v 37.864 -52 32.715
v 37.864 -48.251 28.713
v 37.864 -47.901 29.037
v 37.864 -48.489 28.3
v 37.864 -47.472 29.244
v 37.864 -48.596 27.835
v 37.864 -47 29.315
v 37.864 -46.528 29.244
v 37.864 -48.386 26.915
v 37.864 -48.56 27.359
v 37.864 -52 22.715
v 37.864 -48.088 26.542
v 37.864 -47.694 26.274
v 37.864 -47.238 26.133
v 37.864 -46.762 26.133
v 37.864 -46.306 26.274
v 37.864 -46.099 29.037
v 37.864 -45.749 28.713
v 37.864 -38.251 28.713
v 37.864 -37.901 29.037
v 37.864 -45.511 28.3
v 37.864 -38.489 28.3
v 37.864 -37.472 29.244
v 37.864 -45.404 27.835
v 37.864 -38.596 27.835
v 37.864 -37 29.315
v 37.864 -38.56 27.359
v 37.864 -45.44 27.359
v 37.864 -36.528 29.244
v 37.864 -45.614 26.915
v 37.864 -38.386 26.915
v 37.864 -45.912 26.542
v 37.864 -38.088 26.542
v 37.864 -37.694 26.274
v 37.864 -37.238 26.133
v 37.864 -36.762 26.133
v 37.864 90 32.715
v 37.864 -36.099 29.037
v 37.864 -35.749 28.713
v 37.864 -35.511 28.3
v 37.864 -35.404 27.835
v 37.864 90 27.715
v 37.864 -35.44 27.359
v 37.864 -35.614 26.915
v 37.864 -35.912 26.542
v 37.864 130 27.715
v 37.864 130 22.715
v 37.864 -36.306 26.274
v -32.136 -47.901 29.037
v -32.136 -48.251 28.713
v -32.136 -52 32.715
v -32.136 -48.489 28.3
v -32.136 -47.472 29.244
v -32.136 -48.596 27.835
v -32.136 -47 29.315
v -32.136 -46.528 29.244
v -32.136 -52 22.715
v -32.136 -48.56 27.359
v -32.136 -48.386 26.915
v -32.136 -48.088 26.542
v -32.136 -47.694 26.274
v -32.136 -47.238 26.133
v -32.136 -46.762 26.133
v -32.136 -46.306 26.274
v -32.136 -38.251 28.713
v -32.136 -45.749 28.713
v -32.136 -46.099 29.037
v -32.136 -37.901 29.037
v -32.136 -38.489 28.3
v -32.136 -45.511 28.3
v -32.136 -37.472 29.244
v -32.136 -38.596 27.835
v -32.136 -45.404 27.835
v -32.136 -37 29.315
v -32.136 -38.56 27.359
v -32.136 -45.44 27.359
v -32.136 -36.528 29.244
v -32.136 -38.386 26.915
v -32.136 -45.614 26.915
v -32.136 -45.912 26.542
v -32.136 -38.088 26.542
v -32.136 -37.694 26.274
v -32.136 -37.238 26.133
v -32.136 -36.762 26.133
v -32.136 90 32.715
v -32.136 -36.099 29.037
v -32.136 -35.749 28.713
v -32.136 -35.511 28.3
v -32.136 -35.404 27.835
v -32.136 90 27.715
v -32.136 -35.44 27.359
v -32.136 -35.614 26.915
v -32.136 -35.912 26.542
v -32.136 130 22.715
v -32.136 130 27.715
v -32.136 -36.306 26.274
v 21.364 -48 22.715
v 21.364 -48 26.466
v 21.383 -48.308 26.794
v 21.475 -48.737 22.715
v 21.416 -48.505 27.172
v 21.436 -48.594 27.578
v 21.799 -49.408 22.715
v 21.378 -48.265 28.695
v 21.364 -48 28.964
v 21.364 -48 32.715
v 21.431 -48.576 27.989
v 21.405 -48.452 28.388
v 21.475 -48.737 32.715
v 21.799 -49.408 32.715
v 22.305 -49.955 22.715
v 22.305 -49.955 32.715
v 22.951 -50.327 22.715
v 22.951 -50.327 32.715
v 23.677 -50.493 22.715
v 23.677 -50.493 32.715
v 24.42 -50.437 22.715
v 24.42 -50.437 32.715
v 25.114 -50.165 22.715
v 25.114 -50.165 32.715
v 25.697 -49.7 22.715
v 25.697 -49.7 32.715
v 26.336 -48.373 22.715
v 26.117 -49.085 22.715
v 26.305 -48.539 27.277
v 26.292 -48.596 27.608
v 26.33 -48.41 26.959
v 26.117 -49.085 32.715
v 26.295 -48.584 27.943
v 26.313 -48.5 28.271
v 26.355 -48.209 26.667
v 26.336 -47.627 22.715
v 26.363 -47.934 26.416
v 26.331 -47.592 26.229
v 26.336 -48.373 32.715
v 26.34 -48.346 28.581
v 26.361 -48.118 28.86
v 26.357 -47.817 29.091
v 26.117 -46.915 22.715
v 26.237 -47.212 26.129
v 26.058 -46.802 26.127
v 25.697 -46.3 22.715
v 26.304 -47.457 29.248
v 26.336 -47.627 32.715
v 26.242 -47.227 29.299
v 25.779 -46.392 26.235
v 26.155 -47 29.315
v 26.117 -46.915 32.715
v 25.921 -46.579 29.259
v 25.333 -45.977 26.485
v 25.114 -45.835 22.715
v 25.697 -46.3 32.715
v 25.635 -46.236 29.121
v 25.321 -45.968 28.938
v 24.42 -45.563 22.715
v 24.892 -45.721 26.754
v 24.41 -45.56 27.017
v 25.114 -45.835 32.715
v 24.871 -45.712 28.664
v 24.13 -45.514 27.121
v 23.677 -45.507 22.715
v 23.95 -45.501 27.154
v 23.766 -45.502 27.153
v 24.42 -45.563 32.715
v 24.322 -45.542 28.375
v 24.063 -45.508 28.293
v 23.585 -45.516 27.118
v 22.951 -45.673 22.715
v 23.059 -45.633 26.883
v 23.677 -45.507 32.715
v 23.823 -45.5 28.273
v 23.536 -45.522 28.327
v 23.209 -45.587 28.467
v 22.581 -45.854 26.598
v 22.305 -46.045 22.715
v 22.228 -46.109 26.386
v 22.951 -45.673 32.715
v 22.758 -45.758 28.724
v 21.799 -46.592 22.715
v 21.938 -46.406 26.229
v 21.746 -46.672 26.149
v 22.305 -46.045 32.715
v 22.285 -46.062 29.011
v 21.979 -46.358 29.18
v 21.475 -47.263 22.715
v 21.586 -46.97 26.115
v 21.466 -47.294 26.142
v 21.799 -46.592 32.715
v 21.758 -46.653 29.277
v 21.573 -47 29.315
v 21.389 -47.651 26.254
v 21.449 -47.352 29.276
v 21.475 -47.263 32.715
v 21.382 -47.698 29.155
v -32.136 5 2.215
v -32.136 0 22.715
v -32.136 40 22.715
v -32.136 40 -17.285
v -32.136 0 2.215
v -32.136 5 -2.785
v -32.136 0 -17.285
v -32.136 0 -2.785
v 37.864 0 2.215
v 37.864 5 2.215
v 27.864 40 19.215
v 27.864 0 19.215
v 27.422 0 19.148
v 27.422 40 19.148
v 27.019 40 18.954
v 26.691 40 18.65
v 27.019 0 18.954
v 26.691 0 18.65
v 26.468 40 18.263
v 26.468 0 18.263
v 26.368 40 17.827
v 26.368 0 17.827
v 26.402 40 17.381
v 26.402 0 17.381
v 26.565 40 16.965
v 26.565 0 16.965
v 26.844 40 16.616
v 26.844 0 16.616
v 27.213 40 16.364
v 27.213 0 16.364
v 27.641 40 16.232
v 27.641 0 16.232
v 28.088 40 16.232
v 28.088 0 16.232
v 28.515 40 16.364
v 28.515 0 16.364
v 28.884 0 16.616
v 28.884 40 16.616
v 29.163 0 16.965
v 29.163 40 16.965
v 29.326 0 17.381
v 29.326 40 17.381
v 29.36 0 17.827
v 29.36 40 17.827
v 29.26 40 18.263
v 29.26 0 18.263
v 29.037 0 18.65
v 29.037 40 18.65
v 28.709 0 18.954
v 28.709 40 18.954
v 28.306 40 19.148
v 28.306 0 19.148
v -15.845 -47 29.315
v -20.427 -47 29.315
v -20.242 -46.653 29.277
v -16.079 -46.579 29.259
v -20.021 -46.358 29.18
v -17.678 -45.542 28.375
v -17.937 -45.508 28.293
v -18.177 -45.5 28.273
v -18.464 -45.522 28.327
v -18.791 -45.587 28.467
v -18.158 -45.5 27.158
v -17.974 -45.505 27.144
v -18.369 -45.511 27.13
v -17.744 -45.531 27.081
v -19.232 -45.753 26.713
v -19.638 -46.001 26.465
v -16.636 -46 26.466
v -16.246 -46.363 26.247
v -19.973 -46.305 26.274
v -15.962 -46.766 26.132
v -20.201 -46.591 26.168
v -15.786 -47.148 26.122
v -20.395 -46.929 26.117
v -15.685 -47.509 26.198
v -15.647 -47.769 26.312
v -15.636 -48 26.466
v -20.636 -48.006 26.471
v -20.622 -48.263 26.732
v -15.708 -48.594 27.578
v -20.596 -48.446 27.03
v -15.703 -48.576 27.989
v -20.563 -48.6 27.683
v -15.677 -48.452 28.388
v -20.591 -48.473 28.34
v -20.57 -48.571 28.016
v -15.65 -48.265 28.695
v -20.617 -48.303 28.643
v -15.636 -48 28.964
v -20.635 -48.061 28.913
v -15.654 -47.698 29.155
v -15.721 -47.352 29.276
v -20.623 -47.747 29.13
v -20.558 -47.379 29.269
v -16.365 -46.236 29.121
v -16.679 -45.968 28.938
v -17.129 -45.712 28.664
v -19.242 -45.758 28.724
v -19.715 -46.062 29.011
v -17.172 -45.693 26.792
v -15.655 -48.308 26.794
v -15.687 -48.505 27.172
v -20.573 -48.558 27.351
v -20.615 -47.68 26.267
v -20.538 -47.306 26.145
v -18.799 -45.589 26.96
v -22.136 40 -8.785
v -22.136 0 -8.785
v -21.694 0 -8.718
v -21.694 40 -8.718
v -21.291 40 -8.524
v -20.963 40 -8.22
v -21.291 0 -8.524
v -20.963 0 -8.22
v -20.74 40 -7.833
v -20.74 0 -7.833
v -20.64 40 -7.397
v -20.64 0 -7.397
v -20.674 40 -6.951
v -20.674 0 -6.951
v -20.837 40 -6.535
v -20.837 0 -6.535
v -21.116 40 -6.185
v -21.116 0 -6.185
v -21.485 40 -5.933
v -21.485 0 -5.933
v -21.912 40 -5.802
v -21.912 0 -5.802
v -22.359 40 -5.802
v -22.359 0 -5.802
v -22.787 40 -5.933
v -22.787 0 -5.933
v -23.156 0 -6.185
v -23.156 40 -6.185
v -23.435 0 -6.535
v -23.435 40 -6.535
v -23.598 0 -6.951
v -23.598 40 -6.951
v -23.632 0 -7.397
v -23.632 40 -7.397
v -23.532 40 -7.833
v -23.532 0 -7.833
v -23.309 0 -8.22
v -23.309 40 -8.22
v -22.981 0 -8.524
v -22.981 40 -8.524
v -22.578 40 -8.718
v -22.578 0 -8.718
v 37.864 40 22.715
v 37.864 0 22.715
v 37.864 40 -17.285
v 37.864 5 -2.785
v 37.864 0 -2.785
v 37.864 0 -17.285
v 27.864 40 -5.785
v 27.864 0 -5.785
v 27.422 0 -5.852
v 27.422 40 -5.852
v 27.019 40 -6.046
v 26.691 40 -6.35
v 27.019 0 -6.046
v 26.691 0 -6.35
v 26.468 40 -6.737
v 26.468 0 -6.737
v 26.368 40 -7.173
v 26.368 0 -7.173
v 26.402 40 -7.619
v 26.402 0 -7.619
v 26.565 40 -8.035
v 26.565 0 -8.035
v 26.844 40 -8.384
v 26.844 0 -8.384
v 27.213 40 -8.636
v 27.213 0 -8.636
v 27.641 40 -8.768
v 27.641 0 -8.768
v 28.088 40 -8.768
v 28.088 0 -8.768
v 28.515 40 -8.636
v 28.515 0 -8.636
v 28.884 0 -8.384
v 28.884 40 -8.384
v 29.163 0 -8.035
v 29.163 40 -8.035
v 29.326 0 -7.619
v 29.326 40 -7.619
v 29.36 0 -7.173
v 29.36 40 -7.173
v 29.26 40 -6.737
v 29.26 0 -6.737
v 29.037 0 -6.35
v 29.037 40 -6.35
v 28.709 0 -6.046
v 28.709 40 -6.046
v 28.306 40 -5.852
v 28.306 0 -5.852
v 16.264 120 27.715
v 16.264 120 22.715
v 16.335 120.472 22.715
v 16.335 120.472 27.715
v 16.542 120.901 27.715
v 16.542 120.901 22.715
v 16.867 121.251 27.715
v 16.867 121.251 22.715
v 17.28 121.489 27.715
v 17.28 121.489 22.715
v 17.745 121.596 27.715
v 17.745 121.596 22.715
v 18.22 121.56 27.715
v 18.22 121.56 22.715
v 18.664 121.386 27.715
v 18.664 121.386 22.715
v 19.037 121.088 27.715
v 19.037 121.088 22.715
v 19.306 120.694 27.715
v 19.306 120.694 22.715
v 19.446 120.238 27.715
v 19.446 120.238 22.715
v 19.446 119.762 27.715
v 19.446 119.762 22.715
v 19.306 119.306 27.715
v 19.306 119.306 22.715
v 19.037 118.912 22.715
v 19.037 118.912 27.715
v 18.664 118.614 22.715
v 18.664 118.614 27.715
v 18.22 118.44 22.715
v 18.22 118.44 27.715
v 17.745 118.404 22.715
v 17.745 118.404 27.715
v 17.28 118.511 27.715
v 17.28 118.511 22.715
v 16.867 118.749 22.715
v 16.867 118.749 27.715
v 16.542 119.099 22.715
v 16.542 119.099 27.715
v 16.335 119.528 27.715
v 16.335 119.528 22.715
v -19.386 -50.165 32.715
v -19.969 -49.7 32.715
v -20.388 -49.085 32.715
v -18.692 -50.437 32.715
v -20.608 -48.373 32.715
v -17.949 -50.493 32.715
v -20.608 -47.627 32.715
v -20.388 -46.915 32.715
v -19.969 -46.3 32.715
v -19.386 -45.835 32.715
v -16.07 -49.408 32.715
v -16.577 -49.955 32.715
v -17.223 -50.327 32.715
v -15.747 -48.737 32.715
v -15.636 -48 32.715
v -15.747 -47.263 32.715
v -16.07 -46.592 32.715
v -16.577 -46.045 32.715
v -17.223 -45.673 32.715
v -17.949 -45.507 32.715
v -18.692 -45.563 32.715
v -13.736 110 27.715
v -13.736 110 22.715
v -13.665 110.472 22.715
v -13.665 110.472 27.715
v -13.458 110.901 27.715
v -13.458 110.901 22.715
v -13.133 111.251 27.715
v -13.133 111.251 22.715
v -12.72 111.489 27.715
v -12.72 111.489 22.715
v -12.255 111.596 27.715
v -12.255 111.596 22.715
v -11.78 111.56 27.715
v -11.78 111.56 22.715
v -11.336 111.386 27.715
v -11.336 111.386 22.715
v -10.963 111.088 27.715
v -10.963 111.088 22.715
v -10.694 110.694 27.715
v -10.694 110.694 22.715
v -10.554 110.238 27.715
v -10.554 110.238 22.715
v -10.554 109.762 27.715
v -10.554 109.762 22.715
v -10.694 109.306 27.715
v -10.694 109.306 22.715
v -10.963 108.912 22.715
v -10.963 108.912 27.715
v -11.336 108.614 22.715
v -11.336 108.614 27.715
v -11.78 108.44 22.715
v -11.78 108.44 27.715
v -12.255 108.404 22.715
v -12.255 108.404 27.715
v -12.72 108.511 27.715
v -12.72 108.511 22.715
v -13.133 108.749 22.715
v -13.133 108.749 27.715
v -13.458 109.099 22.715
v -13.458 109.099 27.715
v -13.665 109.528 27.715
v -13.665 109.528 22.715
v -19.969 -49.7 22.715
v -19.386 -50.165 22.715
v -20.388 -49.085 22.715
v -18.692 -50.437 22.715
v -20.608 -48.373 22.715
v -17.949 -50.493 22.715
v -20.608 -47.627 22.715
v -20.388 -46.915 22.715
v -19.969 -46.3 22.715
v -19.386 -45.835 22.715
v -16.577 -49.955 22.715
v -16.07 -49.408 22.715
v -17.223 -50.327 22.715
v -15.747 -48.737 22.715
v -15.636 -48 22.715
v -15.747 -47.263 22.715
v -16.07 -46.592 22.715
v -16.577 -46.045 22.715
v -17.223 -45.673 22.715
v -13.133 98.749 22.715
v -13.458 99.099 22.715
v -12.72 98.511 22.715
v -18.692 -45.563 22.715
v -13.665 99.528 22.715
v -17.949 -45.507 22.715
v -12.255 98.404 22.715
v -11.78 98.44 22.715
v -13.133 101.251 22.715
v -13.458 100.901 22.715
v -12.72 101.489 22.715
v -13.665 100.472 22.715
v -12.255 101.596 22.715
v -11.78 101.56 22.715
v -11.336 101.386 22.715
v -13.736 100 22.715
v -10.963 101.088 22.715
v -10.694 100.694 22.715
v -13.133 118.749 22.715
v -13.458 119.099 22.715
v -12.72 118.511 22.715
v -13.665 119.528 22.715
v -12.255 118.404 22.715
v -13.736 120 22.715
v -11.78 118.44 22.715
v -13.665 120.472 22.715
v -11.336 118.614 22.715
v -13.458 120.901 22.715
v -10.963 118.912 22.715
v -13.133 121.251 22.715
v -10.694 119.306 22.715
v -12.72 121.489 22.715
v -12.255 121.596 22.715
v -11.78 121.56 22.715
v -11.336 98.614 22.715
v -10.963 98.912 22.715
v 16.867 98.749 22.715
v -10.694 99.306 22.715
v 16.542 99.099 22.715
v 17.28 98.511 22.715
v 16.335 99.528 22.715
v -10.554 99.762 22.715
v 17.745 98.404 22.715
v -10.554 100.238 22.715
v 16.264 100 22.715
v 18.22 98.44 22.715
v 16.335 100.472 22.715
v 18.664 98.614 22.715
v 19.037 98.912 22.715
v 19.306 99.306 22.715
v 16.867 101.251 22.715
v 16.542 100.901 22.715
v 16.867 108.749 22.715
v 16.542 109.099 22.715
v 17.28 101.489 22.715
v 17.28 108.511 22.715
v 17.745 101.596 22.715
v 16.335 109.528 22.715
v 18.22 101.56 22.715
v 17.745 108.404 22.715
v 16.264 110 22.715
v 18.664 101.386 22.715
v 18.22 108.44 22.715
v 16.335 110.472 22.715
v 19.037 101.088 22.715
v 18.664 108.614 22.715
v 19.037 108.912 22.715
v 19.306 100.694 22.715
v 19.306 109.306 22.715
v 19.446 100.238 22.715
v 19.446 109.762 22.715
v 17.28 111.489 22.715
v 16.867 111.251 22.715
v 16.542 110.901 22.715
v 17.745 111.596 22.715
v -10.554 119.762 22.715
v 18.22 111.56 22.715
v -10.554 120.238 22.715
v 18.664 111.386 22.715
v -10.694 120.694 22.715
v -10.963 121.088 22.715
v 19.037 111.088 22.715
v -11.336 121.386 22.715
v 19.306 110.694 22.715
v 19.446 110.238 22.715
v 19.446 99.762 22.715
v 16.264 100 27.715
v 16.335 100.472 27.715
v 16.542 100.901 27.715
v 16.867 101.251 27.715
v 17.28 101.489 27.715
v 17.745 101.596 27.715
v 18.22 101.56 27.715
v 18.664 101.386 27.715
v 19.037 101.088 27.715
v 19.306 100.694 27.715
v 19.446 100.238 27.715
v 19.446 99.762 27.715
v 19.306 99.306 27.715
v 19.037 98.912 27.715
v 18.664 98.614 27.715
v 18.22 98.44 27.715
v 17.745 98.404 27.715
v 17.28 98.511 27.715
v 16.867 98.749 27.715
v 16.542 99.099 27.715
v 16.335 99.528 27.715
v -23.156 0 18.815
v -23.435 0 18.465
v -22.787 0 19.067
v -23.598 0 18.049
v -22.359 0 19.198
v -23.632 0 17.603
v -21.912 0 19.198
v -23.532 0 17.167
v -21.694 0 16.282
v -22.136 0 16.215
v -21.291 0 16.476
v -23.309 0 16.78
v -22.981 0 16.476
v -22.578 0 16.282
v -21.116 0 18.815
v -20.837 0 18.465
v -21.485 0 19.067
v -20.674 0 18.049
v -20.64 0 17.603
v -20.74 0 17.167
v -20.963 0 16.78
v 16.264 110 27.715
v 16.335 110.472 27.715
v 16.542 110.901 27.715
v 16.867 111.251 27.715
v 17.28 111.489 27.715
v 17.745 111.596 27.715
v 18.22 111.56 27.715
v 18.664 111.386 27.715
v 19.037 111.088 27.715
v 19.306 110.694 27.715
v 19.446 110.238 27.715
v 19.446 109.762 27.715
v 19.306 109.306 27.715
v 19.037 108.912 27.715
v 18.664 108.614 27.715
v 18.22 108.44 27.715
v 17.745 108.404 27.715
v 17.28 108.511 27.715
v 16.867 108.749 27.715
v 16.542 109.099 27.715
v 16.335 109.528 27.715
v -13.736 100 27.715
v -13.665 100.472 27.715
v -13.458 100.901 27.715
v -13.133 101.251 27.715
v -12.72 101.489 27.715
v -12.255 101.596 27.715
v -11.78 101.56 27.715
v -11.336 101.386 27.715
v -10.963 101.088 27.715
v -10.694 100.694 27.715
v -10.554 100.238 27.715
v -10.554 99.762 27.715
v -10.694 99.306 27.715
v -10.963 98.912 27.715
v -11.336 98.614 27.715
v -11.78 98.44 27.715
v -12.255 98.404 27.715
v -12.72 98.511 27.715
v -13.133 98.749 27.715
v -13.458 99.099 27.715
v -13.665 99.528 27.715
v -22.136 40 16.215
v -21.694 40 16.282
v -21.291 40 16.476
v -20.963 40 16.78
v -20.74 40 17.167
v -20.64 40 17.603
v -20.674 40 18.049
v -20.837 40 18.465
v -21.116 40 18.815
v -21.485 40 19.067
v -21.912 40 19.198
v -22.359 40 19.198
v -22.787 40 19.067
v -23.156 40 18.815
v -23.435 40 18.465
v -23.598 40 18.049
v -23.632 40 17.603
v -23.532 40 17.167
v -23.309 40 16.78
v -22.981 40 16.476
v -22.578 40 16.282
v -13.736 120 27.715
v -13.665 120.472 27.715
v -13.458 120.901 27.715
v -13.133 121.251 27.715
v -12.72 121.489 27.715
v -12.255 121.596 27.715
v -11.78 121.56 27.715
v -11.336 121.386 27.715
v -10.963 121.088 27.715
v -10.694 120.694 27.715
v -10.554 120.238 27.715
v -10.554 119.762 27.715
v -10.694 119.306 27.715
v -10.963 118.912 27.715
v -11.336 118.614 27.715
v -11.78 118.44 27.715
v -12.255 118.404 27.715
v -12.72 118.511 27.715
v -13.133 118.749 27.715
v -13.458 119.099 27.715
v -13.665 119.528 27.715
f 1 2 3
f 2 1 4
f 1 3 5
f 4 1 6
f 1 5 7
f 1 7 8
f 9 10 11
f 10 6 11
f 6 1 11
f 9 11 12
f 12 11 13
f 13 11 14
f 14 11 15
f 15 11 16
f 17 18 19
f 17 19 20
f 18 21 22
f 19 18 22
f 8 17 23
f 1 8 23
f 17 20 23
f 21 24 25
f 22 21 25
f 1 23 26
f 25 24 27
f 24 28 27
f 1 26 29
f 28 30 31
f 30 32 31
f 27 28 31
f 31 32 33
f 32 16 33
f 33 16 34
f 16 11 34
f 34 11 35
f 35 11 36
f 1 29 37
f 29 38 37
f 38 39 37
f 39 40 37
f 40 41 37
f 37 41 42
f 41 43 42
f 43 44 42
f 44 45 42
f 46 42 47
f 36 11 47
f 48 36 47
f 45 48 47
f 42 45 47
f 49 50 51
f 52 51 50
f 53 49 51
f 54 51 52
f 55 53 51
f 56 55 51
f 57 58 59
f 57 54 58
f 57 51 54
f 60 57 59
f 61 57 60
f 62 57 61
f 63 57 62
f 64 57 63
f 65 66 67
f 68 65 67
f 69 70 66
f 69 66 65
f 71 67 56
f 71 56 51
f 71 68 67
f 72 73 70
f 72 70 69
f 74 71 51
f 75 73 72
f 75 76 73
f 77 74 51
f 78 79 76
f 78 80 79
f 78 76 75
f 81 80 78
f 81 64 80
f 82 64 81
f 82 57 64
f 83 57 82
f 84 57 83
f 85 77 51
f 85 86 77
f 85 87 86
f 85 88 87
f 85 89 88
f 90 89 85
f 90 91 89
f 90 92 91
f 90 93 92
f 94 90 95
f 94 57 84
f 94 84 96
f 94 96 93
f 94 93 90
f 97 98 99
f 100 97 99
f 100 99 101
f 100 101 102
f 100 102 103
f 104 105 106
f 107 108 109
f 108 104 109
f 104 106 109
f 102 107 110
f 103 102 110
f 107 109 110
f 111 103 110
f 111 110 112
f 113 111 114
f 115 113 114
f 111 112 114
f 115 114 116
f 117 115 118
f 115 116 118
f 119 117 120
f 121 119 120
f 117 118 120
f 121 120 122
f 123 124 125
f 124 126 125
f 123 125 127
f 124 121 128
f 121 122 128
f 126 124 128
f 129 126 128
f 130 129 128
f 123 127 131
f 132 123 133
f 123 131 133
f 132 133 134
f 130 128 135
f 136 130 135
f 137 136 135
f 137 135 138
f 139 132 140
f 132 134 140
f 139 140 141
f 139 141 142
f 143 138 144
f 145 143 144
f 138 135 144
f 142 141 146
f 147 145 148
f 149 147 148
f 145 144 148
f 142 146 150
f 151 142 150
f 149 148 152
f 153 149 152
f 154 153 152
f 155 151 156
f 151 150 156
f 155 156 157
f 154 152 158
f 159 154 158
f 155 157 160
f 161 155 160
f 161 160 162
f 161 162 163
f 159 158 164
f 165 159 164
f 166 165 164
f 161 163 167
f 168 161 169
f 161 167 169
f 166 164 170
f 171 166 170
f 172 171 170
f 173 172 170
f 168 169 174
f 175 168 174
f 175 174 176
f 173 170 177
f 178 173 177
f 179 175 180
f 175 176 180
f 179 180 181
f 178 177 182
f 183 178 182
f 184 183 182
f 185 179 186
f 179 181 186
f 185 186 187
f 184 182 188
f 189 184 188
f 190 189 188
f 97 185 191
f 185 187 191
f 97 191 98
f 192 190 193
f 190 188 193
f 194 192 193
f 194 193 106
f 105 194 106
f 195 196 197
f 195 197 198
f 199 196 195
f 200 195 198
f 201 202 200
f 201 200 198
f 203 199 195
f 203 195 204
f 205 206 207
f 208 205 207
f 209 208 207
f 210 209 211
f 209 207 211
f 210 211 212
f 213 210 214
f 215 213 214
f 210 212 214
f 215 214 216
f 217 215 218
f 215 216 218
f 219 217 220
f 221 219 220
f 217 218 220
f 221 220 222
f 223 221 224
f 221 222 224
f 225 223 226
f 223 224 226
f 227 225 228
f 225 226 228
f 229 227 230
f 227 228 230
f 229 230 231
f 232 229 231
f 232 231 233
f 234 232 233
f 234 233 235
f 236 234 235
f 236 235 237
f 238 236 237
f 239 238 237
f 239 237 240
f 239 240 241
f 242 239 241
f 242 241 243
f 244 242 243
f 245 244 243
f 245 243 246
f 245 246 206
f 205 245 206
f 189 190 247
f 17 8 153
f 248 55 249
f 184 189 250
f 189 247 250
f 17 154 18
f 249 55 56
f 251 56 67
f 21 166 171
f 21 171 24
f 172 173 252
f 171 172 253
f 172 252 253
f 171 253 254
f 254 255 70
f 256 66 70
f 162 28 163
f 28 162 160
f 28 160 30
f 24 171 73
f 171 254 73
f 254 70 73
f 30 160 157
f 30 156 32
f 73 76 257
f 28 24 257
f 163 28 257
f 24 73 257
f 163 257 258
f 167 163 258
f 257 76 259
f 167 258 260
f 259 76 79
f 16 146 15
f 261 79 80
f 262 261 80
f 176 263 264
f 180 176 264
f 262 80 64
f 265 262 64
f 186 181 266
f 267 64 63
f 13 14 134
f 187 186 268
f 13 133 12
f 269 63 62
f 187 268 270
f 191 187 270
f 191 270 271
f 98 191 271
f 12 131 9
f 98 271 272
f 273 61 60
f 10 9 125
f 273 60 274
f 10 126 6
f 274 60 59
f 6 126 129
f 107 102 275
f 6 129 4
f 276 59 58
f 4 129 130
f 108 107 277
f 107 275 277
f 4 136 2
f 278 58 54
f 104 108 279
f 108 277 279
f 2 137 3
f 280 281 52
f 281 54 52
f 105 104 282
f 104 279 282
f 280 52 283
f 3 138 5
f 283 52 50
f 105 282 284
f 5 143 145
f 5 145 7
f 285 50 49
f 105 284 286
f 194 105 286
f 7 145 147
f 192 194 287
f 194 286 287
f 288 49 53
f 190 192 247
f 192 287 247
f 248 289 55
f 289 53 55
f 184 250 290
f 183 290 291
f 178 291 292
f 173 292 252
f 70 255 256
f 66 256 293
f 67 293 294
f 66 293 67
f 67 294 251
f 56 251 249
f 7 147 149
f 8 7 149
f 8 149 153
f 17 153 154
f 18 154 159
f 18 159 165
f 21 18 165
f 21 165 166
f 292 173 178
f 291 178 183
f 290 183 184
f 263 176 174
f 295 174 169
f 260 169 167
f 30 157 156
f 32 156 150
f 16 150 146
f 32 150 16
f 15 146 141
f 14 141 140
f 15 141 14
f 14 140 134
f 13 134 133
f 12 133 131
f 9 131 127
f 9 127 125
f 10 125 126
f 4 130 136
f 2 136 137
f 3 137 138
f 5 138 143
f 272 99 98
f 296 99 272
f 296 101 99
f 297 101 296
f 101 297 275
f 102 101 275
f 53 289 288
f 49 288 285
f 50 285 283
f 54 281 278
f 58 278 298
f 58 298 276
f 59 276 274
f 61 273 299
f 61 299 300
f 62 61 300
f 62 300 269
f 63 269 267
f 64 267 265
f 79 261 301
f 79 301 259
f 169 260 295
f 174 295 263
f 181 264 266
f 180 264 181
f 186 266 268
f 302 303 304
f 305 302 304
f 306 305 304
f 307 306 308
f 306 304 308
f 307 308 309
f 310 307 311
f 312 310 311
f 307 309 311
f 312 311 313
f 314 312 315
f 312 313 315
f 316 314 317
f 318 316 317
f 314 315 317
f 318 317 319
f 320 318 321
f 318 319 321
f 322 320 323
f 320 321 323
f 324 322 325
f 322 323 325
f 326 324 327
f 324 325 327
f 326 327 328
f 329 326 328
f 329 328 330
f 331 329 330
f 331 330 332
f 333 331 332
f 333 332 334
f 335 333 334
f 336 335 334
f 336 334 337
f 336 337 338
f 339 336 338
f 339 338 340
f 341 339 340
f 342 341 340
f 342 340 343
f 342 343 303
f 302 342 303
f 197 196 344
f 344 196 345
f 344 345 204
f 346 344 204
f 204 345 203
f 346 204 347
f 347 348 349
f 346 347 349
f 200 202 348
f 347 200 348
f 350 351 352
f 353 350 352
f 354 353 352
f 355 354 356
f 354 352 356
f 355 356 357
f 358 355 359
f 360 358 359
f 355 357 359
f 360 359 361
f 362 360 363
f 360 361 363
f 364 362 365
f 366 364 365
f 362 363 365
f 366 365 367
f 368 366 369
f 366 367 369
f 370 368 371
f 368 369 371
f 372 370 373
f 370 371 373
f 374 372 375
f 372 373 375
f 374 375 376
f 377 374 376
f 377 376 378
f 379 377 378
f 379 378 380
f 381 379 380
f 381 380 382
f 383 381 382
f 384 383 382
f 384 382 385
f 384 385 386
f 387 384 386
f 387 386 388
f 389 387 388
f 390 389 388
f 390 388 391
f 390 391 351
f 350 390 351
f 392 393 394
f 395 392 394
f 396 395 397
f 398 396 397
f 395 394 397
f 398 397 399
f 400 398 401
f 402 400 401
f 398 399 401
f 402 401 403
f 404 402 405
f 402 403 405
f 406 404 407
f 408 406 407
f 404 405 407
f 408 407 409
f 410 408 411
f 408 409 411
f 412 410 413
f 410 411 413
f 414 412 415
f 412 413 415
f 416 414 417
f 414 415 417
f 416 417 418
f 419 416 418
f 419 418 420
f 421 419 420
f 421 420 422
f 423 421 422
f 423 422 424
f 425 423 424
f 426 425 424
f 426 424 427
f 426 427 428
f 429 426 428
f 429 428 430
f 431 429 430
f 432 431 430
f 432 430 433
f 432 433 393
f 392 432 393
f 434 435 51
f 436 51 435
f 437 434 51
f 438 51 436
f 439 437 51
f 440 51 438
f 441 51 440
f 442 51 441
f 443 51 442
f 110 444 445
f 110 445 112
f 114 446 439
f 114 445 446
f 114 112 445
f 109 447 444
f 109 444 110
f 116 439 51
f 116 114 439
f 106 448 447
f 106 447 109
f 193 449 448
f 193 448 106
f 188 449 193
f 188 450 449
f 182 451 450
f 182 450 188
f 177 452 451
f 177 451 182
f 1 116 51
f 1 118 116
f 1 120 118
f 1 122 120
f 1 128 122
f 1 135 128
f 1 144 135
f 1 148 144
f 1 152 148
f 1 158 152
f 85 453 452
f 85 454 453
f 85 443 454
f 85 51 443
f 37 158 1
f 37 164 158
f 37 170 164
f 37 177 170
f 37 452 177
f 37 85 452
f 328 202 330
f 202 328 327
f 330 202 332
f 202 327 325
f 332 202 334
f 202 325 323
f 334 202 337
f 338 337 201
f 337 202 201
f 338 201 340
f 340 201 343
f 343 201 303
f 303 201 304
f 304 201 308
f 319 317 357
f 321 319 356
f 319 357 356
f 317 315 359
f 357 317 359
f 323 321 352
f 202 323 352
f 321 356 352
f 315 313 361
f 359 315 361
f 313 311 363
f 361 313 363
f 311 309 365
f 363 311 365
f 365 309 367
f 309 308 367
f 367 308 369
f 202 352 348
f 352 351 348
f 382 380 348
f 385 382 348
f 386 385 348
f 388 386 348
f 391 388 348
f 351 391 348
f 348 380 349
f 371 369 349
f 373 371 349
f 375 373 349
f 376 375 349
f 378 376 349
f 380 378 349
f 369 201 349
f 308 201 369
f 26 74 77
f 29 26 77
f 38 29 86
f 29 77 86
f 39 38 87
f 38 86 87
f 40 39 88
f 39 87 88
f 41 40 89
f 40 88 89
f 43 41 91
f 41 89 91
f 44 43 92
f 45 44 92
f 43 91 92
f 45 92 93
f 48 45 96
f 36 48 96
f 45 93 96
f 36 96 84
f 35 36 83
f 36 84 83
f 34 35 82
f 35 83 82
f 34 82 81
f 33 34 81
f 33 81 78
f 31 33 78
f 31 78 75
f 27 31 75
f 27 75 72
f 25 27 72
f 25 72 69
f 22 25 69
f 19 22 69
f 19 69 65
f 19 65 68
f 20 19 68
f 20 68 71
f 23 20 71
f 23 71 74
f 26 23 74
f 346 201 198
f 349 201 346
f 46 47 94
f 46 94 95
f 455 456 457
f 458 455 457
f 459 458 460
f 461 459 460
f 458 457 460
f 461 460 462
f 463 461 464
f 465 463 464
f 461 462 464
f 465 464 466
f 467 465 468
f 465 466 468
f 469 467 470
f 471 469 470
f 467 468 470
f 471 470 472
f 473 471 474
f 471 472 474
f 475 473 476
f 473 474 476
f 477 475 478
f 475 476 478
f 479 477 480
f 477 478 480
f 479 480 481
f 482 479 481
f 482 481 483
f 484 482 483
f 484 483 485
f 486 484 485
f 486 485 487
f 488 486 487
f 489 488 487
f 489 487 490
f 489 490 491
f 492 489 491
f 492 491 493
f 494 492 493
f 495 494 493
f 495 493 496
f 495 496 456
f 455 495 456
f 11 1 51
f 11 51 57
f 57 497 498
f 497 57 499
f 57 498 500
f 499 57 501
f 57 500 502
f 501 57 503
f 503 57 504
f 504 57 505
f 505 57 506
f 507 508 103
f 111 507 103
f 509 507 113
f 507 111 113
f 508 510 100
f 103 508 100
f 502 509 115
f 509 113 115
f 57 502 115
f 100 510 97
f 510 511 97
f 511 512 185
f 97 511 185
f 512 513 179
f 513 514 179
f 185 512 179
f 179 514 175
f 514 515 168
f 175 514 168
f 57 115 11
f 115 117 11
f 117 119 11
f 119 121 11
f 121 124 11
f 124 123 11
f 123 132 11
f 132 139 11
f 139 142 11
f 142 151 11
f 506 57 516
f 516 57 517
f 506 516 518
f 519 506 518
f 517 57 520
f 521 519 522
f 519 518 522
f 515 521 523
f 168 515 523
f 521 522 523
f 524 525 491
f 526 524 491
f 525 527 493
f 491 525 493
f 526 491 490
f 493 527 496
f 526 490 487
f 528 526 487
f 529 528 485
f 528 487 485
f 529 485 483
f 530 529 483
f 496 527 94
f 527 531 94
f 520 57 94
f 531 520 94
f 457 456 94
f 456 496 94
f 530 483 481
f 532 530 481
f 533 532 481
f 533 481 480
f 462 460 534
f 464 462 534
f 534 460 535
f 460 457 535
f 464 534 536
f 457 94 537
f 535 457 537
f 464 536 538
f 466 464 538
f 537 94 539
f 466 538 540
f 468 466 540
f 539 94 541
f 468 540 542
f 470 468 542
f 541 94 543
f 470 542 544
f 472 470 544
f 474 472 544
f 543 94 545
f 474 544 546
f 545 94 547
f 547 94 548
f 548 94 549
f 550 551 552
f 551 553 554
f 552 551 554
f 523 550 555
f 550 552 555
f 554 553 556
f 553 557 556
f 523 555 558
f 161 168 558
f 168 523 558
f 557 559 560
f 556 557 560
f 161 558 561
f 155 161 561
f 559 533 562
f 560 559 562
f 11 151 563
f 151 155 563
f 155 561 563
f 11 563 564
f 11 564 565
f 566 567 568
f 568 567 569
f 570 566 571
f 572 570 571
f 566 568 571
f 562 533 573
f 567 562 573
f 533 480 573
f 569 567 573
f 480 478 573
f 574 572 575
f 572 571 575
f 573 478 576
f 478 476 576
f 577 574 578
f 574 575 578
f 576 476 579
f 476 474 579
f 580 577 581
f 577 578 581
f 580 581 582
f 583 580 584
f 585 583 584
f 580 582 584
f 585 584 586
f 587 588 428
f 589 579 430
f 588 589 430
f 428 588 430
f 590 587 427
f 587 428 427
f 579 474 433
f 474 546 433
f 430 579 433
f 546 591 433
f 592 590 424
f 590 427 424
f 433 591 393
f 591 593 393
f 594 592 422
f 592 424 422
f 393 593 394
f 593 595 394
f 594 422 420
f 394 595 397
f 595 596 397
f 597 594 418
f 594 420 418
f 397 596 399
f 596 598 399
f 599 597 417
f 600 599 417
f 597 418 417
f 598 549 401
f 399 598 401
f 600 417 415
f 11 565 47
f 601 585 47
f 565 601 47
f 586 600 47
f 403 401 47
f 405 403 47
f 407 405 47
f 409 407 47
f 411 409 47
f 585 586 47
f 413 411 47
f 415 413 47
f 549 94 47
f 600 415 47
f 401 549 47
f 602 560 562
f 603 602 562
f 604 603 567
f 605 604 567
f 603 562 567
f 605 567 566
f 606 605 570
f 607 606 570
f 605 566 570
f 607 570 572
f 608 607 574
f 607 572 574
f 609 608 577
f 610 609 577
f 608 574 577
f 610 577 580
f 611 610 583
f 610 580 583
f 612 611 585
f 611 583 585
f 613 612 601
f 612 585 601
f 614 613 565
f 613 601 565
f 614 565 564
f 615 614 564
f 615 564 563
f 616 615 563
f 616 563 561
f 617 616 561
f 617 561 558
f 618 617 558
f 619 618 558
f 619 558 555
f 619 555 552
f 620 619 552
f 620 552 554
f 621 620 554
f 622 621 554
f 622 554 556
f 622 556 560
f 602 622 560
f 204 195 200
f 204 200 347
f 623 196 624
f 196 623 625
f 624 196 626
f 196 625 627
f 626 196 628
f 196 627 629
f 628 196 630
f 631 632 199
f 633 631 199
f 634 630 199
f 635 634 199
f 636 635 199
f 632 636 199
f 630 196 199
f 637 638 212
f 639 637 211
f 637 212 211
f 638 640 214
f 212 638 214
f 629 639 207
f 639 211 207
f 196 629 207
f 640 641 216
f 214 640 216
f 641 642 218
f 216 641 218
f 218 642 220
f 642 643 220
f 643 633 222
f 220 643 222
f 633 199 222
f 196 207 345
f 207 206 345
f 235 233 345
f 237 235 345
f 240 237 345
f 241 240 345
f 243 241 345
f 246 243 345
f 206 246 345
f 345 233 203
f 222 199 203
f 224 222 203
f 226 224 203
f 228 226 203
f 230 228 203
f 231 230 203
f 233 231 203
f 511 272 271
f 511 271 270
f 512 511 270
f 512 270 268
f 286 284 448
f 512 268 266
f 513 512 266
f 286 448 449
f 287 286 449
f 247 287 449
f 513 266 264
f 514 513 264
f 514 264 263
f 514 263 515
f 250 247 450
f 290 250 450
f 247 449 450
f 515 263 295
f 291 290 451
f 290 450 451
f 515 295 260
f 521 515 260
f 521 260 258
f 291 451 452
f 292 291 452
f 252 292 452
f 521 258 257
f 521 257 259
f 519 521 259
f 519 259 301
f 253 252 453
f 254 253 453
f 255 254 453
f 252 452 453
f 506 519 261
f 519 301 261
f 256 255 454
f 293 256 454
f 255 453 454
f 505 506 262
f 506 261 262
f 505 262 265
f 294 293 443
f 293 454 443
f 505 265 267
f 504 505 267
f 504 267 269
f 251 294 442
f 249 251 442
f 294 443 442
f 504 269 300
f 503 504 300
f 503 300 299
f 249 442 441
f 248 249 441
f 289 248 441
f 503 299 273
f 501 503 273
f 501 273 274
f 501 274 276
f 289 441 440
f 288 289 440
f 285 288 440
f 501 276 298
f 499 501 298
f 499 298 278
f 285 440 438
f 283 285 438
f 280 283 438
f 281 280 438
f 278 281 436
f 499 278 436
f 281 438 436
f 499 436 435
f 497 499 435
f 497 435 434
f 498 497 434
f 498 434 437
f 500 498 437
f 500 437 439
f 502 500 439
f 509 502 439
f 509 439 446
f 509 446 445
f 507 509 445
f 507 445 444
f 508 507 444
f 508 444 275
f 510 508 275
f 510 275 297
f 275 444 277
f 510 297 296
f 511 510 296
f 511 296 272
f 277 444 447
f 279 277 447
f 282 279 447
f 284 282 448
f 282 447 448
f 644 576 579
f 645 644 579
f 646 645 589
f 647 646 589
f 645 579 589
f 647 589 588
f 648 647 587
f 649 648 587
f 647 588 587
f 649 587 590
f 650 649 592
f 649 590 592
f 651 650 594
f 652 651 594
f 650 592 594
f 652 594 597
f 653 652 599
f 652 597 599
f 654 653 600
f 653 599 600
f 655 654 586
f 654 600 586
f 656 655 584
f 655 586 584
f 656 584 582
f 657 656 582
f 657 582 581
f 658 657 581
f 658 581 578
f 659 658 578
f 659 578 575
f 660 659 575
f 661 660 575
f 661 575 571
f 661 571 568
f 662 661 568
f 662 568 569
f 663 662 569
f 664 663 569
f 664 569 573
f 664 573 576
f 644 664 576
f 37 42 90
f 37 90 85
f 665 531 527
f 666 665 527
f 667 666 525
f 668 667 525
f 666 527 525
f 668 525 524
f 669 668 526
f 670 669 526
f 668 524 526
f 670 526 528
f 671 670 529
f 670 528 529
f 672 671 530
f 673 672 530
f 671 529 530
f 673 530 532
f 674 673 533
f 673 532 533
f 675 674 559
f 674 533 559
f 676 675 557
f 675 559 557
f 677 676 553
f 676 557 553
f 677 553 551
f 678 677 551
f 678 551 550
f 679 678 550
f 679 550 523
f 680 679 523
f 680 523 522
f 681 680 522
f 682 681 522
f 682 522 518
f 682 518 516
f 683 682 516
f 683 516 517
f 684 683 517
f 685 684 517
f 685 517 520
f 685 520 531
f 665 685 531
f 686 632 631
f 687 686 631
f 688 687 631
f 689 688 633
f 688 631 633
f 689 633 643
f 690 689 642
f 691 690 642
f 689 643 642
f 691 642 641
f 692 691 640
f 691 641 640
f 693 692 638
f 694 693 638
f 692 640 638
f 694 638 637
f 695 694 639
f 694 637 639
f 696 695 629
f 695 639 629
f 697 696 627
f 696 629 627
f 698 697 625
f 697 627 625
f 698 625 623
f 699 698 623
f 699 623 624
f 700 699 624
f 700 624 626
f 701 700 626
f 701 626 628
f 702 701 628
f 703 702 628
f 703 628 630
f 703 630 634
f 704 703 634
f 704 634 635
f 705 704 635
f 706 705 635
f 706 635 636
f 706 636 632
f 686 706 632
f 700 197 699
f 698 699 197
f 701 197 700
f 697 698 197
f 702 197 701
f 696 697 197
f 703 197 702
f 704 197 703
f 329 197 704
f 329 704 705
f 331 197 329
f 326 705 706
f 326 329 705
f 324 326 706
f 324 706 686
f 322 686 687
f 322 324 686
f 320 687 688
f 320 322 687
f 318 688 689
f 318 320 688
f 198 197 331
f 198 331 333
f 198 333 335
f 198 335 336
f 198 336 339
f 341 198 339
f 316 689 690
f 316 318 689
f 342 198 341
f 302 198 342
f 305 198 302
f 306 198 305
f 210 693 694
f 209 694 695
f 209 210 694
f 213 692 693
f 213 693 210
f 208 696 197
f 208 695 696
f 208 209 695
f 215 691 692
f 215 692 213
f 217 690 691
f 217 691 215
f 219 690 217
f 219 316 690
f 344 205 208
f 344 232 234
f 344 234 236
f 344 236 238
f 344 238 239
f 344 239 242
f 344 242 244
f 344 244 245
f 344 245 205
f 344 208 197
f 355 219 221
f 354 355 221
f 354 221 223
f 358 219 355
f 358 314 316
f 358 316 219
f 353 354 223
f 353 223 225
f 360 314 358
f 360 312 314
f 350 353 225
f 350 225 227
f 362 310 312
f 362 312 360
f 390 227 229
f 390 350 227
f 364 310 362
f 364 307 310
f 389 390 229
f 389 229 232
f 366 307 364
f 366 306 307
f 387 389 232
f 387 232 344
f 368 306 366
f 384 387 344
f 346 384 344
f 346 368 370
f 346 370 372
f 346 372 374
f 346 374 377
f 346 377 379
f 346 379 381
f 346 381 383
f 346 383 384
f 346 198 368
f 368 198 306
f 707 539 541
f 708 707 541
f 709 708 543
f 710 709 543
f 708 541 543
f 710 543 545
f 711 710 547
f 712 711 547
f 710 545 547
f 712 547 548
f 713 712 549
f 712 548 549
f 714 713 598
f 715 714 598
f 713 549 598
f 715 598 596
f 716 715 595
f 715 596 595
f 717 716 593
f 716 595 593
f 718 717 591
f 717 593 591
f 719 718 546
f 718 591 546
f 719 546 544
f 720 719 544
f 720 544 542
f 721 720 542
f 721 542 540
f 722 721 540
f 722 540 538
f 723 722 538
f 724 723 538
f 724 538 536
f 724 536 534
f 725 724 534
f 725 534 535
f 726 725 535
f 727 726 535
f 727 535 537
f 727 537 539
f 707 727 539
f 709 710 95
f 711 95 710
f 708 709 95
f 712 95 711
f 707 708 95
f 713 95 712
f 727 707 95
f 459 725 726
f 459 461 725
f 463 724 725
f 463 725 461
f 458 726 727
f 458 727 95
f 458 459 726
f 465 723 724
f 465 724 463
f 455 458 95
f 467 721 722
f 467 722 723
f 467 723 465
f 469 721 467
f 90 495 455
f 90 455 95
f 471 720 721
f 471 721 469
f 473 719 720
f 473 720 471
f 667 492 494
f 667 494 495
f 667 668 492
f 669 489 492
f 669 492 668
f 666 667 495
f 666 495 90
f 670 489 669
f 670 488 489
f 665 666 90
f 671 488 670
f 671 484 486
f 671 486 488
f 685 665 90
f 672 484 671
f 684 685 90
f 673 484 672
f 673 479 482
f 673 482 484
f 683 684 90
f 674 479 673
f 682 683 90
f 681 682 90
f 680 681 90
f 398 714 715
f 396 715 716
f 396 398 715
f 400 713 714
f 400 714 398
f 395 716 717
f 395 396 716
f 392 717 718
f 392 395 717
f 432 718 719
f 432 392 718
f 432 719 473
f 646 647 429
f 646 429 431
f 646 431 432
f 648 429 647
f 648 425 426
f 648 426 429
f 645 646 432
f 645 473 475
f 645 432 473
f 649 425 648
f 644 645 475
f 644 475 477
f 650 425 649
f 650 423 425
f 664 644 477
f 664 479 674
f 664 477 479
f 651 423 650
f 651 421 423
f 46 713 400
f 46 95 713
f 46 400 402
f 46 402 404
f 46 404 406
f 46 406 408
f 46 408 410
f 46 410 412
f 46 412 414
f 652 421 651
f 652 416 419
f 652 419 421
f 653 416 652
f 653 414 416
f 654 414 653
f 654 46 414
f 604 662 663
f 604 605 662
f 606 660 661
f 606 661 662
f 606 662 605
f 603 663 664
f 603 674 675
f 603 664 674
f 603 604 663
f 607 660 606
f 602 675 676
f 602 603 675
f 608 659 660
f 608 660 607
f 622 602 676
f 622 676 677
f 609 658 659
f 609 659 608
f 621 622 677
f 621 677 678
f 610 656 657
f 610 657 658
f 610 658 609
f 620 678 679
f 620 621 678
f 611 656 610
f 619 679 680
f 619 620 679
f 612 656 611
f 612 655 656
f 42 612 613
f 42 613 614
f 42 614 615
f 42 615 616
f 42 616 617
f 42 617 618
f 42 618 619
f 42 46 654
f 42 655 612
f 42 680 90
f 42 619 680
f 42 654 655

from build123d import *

# Parameters (mm, degrees)
SKETCH_1_W                       = 70
SKETCH_1_H                       = 40
EXTRUDE_1_DEPTH                  = 40
SKETCH_2_R                       = 1.5
CUT_EXTRUDE_1_DEPTH              = 60.579081363
EXTRUDE_2_DEPTH                  = 52
EXTRUDE_2_DEPTH_BACK             = 236
SKETCH_4_W                       = 70
SKETCH_4_H                       = 10
SKETCH_5_R                       = 2.5
CUT_EXTRUDE_2_DEPTH              = 10
SKETCH_6_R                       = 3
CUT_EXTRUDE_3_DEPTH              = 10
SKETCH_7_W                       = 70
SKETCH_7_H                       = 10
EXTRUDE_3_DEPTH                  = 50
SKETCH_8_R                       = 12.5
CUT_EXTRUDE_4_DEPTH              = 10
SKETCH_12_W                      = 39
SKETCH_12_H                      = 39
SKETCH_12_W_2                    = 27
SKETCH_12_H_2                    = 27
EXTRUDE_2_2_DEPTH                = 15
SKETCH_14_R                      = 2
CUT_EXTRUDE_5_DEPTH              = 25
SKETCH_15_W                      = 70
SKETCH_15_H                      = 5
CUT_EXTRUDE_6_DEPTH              = 5
SKETCH_16_W                      = 50
SKETCH_16_H                      = 10
EXTRUDE_5_DEPTH                  = 10
MIRROR_2_COPY_1_SKETCH_W         = 50
MIRROR_2_COPY_1_SKETCH_H         = 10
MIRROR_2_COPY_1_DEPTH            = 10
SKETCH_17_R                      = 2.5
CUT_EXTRUDE_7_DEPTH              = 325.880687163
SKETCH_18_R                      = 2.5
EXTRUDE_6_DEPTH                  = 5
SKETCH_21_W                      = 10
SKETCH_21_H                      = 10
EXTRUDE_8_DEPTH                  = 10
EXTRUDE_9_DEPTH                  = 10
EXTRUDE_10_DEPTH                 = 10
SKETCH_26_R                      = 1.6
CUT_EXTRUDE_8_DEPTH              = 10
SPLIT_BODIES_1_SURFACE_1_BACK    = 338.889
SPLIT_BODIES_1_SURFACE_1_DEPTH   = 677.778
SPLIT_BODIES_1_SURFACE_2_BACK    = 338.889
SPLIT_BODIES_1_SURFACE_2_DEPTH   = 677.778
SKETCH_27_R                      = 1.6
CUT_EXTRUDE_9_DEPTH              = 175.033009856
SPLIT_BODIES_2_SURFACE_1_3_BACK  = 223.09
SPLIT_BODIES_2_SURFACE_1_3_DEPTH = 446.18
SPLIT_BODIES_2_SURFACE_1_4_BACK  = 223.09
SPLIT_BODIES_2_SURFACE_1_4_DEPTH = 446.18
SPLIT_BODIES_2_SURFACE_2_5_BACK  = 223.09
SPLIT_BODIES_2_SURFACE_2_5_DEPTH = 446.18
SPLIT_BODIES_2_SURFACE_2_6_BACK  = 223.09
SPLIT_BODIES_2_SURFACE_2_6_DEPTH = 446.18


with BuildPart() as part:
    # 草图1 → 凸台-拉伸1 (new body)
    with BuildSketch(Plane(origin=(0, 0, 0), x_dir=(1, 0, 0), z_dir=(0, 1, 0))):
        with Locations((2.864103165, -2.71511892)):
            Rectangle(SKETCH_1_W, SKETCH_1_H)
    extrude(amount=EXTRUDE_1_DEPTH)

    # 草图2 → 切除-拉伸1 (cut, through all)
    with BuildSketch(Plane.XZ):
        with Locations(Location((-22.135896835, 17.71511892, 0), (0, 0, 270))):
            Circle(SKETCH_2_R)
        with Locations(Location((27.864103165, 17.71511892, 0), (0, 0, 90))):
            Circle(SKETCH_2_R)
        with Locations(Location((-22.135896835, -7.28488108, 0), (0, 0, 270))):
            Circle(SKETCH_2_R)
        with Locations(Location((27.864103165, -7.28488108, 0), (0, 0, 90))):
            Circle(SKETCH_2_R)
    extrude(amount=-CUT_EXTRUDE_1_DEPTH, mode=Mode.SUBTRACT)

    # 草图15 → 切除-拉伸6 (cut)
    with BuildSketch(Plane.XZ):
        with Locations((2.864103165, -0.28488108)):
            Rectangle(SKETCH_15_W, SKETCH_15_H)
    extrude(amount=-CUT_EXTRUDE_6_DEPTH, mode=Mode.SUBTRACT)


with BuildPart() as body_2:
    # 草图4 → Extrude 2 (new, two sides: drawn at the far end of the back side and taken through both)
    with BuildSketch(Plane.XZ.offset(-EXTRUDE_2_DEPTH_BACK)):
        with Locations((2.864103165, 27.71511892)):
            Rectangle(SKETCH_4_W, SKETCH_4_H)
    extrude(amount=EXTRUDE_2_DEPTH + EXTRUDE_2_DEPTH_BACK)

    # 草图5 → 切除-拉伸2 (cut)
    with BuildSketch(Plane.XY.offset(32.71511892)):
        with Locations((-18.135896835, -48)):
            Circle(SKETCH_5_R)
        with Locations(Location((23.864103165, -48, 0), (0, 0, 180))):
            Circle(SKETCH_5_R)
    extrude(amount=-CUT_EXTRUDE_2_DEPTH, mode=Mode.SUBTRACT)

    # 草图6 → 切除-拉伸3 (cut)
    with BuildSketch(Plane.XY.offset(32.71511892)):
        with Locations((-18.135896835, 212)):
            Circle(SKETCH_6_R)
        with Locations(Location((23.864103165, 212, 0), (0, 0, 180))):
            Circle(SKETCH_6_R)
    extrude(amount=-CUT_EXTRUDE_3_DEPTH, mode=Mode.SUBTRACT)

    # 草图7 → 凸台-拉伸3 (add)
    with BuildSketch(Plane(origin=(0, 0, 22.71511892), x_dir=(-1, 0, 0), z_dir=(0, 0, -1))):
        with Locations((-2.864103165, 241)):
            Rectangle(SKETCH_7_W, SKETCH_7_H)
    extrude(amount=-EXTRUDE_3_DEPTH)

    # 草图8 → 切除-拉伸4 (cut)
    with BuildSketch(Plane.XZ.offset(-236)):
        with Locations(Location((2.864103165, 52.71511892, 0), (0, 0, 270))):
            Circle(SKETCH_8_R)
    extrude(amount=-CUT_EXTRUDE_4_DEPTH, mode=Mode.SUBTRACT)

    # 草图12 → Extrude 2 2 (add)
    with BuildSketch(Plane(origin=(0, 246, 0), x_dir=(1, 0, 0), z_dir=(0, 1, 0))):
        with Locations((2.864103165, -52.71511892)):
            Rectangle(SKETCH_12_W, SKETCH_12_H)
        with Locations((2.864103165, -52.71511892)):
            Rectangle(SKETCH_12_W_2, SKETCH_12_H_2, mode=Mode.SUBTRACT)
    extrude(amount=EXTRUDE_2_2_DEPTH)

    # 草图14 → 切除-拉伸5 (cut)
    with BuildSketch(Plane(origin=(0, 261, 0), x_dir=(1, 0, 0), z_dir=(0, 1, 0))):
        with Locations(Location((-12.635896835, -37.21511892, 0), (0, 0, 270))):
            Circle(SKETCH_14_R)
        with Locations(Location((18.364103165, -37.21511892, 0), (0, 0, 90))):
            Circle(SKETCH_14_R)
        with Locations(Location((-12.635896835, -68.21511892, 0), (0, 0, 90))):
            Circle(SKETCH_14_R)
        with Locations(Location((18.364103165, -68.21511892, 0), (0, 0, 270))):
            Circle(SKETCH_14_R)
    extrude(amount=-CUT_EXTRUDE_5_DEPTH, mode=Mode.SUBTRACT)

    # 草图16 → 凸台-拉伸5 (add)
    with BuildSketch(Plane.ZY.offset(32.135896835)):
        with Locations((47.71511892, 241)):
            Rectangle(SKETCH_16_W, SKETCH_16_H)
    extrude_5 = extrude(amount=EXTRUDE_5_DEPTH)

    # 镜向1: 凸台-拉伸5 across plane
    add(extrude_5.mirror(Plane.ZX.offset(97)))

    # 镜向2: 凸台-拉伸5 across plane
    add(extrude_5.mirror(Plane.ZY.offset(-2.864103165)))

    # 镜向2 copy 1 sketch → 镜向2 copy 1 (add)
    with BuildSketch(Plane(origin=(37.864103165, 194, 0), x_dir=(0, 0, 1), z_dir=(1, 0, 0))):
        with Locations((47.71511892, 241)):
            Rectangle(MIRROR_2_COPY_1_SKETCH_W, MIRROR_2_COPY_1_SKETCH_H)
    extrude(amount=MIRROR_2_COPY_1_DEPTH)

    # 草图17 → 切除-拉伸7 (cut, through all)
    with BuildSketch(Plane.XZ.offset(52)):
        with Locations(Location((-37.135896835, 52.71511892, 0), (0, 0, 270))):
            Circle(SKETCH_17_R)
        with Locations(Location((42.864103165, 52.71511892, 0), (0, 0, 270))):
            Circle(SKETCH_17_R)
    extrude(amount=-CUT_EXTRUDE_7_DEPTH, mode=Mode.SUBTRACT)

    # 草图18 → 凸台-拉伸6 (add)
    with BuildSketch(Plane.XZ.offset(52)):
        with Locations(Location((-37.135896835, 52.71511892, 0), (0, 0, 270))):
            Circle(SKETCH_18_R)
        with Locations(Location((42.864103165, 52.71511892, 0), (0, 0, 270))):
            Circle(SKETCH_18_R)
    extrude(amount=-EXTRUDE_6_DEPTH)

    # 草图21 → 凸台-拉伸8 (add)
    with BuildSketch(Plane(origin=(0, 0, 22.71511892), x_dir=(-1, 0, 0), z_dir=(0, 0, -1))):
        with Locations((-42.864103165, -37)):
            Rectangle(SKETCH_21_W, SKETCH_21_H)
    extrude_8 = extrude(amount=-EXTRUDE_8_DEPTH)

    # 镜向3: 凸台-拉伸8 across plane
    add(extrude_8.mirror(Plane.ZY.offset(-2.864103165)))

    # 草图22 → 凸台-拉伸9 (add)
    with BuildSketch(Plane(origin=(47.864103165, 0, 0), x_dir=(0, 0, -1), z_dir=(1, 0, 0))):
        Polygon((-32.71511892, -32), (-42.71511892, -42), (-32.71511892, -42), align=None)
    extrude(amount=-EXTRUDE_9_DEPTH)

    # 草图23 → 凸台-拉伸10 (add)
    with BuildSketch(Plane.ZY.offset(42.135896835)):
        Polygon((32.71511892, -32), (42.71511892, -42), (32.71511892, -42), align=None)
    extrude(amount=-EXTRUDE_10_DEPTH)

    # 草图26 → 切除-拉伸8 (cut)
    with BuildSketch(Plane(origin=(0, 0, 22.71511892), x_dir=(-1, 0, 0), z_dir=(0, 0, -1))):
        with Locations((-17.864103165, 100)):
            Circle(SKETCH_26_R)
        with Locations((-17.864103165, 110)):
            Circle(SKETCH_26_R)
        with Locations((-17.864103165, 120)):
            Circle(SKETCH_26_R)
        with Locations((12.135896835, 120)):
            Circle(SKETCH_26_R)
        with Locations((12.135896835, 110)):
            Circle(SKETCH_26_R)
        with Locations((12.135896835, 100)):
            Circle(SKETCH_26_R)
    extrude(amount=-CUT_EXTRUDE_8_DEPTH, mode=Mode.SUBTRACT)


with BuildPart() as body_3:
    # Split Bodies 1: the piece behind the surface
    add(body_2.part)
    # Split Bodies 1 surface: a surface, the sketch's curves swept straight by 677.778 mm
    with BuildLine(Plane.ZY.offset(32.135896835).offset(-SPLIT_BODIES_1_SURFACE_1_BACK), mode=Mode.PRIVATE) as split_bodies_1_surface_1_path:
        Line((22.71511892, 130), (27.71511892, 130))
        Line((27.71511892, 130), (27.71511892, 90))
        Line((27.71511892, 90), (32.71511892, 90))
    split_bodies_1_surface_1 = Shell.extrude(split_bodies_1_surface_1_path.wire(), (-1 * SPLIT_BODIES_1_SURFACE_1_DEPTH, 0 * SPLIT_BODIES_1_SURFACE_1_DEPTH, 0 * SPLIT_BODIES_1_SURFACE_1_DEPTH))
    split(bisect_by=split_bodies_1_surface_1, keep=Keep.BOTTOM)

    # 草图27 → 切除-拉伸9 (cut, through all)
    with BuildSketch(Plane.ZY.offset(42.135896835)):
        with Locations((27.71511892, -37)):
            Circle(SKETCH_27_R)
        with Locations((27.71511892, -47)):
            Circle(SKETCH_27_R)
    extrude(amount=-CUT_EXTRUDE_9_DEPTH, mode=Mode.SUBTRACT)


with BuildPart() as body_2_1:
    add(body_2.part)

    # Split Bodies 1: split by a surface, the side it looks to stays
    # Split Bodies 1 surface: a surface, the sketch's curves swept straight by 677.778 mm
    with BuildLine(Plane.ZY.offset(32.135896835).offset(-SPLIT_BODIES_1_SURFACE_2_BACK), mode=Mode.PRIVATE) as split_bodies_1_surface_2_path:
        Line((22.71511892, 130), (27.71511892, 130))
        Line((27.71511892, 130), (27.71511892, 90))
        Line((27.71511892, 90), (32.71511892, 90))
    split_bodies_1_surface_2 = Shell.extrude(split_bodies_1_surface_2_path.wire(), (-1 * SPLIT_BODIES_1_SURFACE_2_DEPTH, 0 * SPLIT_BODIES_1_SURFACE_2_DEPTH, 0 * SPLIT_BODIES_1_SURFACE_2_DEPTH))
    split(bisect_by=split_bodies_1_surface_2, keep=Keep.TOP)


with BuildPart() as body_3_2:
    # Split Bodies 2: the piece behind the surface
    add(body_3.part)
    # Split Bodies 2 surface 1: a surface, the sketch's curves swept straight by 446.18 mm
    with BuildLine(Plane(origin=(0, 0, 22.71511892), x_dir=(-1, 0, 0), z_dir=(0, 0, -1)).offset(-SPLIT_BODIES_2_SURFACE_1_3_BACK), mode=Mode.PRIVATE) as split_bodies_2_surface_1_3_path:
        Line((-37.864103165, -32), (-37.864103165, -52))
    split_bodies_2_surface_1_3 = Shell.extrude(split_bodies_2_surface_1_3_path.wire(), (0 * SPLIT_BODIES_2_SURFACE_1_3_DEPTH, 0 * SPLIT_BODIES_2_SURFACE_1_3_DEPTH, -1 * SPLIT_BODIES_2_SURFACE_1_3_DEPTH))
    split(bisect_by=split_bodies_2_surface_1_3, keep=Keep.BOTTOM)


with BuildPart() as body_3_1:
    add(body_3.part)

    # Split Bodies 2: split by a surface, the side it looks to stays
    # Split Bodies 2 surface 1: a surface, the sketch's curves swept straight by 446.18 mm
    with BuildLine(Plane(origin=(0, 0, 22.71511892), x_dir=(-1, 0, 0), z_dir=(0, 0, -1)).offset(-SPLIT_BODIES_2_SURFACE_1_4_BACK), mode=Mode.PRIVATE) as split_bodies_2_surface_1_4_path:
        Line((-37.864103165, -32), (-37.864103165, -52))
    split_bodies_2_surface_1_4 = Shell.extrude(split_bodies_2_surface_1_4_path.wire(), (0 * SPLIT_BODIES_2_SURFACE_1_4_DEPTH, 0 * SPLIT_BODIES_2_SURFACE_1_4_DEPTH, -1 * SPLIT_BODIES_2_SURFACE_1_4_DEPTH))
    split(bisect_by=split_bodies_2_surface_1_4, keep=Keep.TOP)


with BuildPart() as body_4:
    # Split Bodies 2 2: the piece behind the surface
    add(body_3_1.part)
    # Split Bodies 2 surface 2: a surface, the sketch's curves swept straight by 446.18 mm
    with BuildLine(Plane(origin=(0, 0, 22.71511892), x_dir=(-1, 0, 0), z_dir=(0, 0, -1)).offset(-SPLIT_BODIES_2_SURFACE_2_5_BACK), mode=Mode.PRIVATE) as split_bodies_2_surface_2_5_path:
        Line((32.135896835, -32), (32.135896835, -52))
    split_bodies_2_surface_2_5 = Shell.extrude(split_bodies_2_surface_2_5_path.wire(), (0 * SPLIT_BODIES_2_SURFACE_2_5_DEPTH, 0 * SPLIT_BODIES_2_SURFACE_2_5_DEPTH, -1 * SPLIT_BODIES_2_SURFACE_2_5_DEPTH))
    split(bisect_by=split_bodies_2_surface_2_5, keep=Keep.BOTTOM)


with BuildPart() as body_3_3:
    add(body_3_1.part)

    # Split Bodies 2 2: split by a surface, the side it looks to stays
    # Split Bodies 2 surface 2: a surface, the sketch's curves swept straight by 446.18 mm
    with BuildLine(Plane(origin=(0, 0, 22.71511892), x_dir=(-1, 0, 0), z_dir=(0, 0, -1)).offset(-SPLIT_BODIES_2_SURFACE_2_6_BACK), mode=Mode.PRIVATE) as split_bodies_2_surface_2_6_path:
        Line((32.135896835, -32), (32.135896835, -52))
    split_bodies_2_surface_2_6 = Shell.extrude(split_bodies_2_surface_2_6_path.wire(), (0 * SPLIT_BODIES_2_SURFACE_2_6_DEPTH, 0 * SPLIT_BODIES_2_SURFACE_2_6_DEPTH, -1 * SPLIT_BODIES_2_SURFACE_2_6_DEPTH))
    split(bisect_by=split_bodies_2_surface_2_6, keep=Keep.TOP)


solid = Compound([part.part, body_4.part])
